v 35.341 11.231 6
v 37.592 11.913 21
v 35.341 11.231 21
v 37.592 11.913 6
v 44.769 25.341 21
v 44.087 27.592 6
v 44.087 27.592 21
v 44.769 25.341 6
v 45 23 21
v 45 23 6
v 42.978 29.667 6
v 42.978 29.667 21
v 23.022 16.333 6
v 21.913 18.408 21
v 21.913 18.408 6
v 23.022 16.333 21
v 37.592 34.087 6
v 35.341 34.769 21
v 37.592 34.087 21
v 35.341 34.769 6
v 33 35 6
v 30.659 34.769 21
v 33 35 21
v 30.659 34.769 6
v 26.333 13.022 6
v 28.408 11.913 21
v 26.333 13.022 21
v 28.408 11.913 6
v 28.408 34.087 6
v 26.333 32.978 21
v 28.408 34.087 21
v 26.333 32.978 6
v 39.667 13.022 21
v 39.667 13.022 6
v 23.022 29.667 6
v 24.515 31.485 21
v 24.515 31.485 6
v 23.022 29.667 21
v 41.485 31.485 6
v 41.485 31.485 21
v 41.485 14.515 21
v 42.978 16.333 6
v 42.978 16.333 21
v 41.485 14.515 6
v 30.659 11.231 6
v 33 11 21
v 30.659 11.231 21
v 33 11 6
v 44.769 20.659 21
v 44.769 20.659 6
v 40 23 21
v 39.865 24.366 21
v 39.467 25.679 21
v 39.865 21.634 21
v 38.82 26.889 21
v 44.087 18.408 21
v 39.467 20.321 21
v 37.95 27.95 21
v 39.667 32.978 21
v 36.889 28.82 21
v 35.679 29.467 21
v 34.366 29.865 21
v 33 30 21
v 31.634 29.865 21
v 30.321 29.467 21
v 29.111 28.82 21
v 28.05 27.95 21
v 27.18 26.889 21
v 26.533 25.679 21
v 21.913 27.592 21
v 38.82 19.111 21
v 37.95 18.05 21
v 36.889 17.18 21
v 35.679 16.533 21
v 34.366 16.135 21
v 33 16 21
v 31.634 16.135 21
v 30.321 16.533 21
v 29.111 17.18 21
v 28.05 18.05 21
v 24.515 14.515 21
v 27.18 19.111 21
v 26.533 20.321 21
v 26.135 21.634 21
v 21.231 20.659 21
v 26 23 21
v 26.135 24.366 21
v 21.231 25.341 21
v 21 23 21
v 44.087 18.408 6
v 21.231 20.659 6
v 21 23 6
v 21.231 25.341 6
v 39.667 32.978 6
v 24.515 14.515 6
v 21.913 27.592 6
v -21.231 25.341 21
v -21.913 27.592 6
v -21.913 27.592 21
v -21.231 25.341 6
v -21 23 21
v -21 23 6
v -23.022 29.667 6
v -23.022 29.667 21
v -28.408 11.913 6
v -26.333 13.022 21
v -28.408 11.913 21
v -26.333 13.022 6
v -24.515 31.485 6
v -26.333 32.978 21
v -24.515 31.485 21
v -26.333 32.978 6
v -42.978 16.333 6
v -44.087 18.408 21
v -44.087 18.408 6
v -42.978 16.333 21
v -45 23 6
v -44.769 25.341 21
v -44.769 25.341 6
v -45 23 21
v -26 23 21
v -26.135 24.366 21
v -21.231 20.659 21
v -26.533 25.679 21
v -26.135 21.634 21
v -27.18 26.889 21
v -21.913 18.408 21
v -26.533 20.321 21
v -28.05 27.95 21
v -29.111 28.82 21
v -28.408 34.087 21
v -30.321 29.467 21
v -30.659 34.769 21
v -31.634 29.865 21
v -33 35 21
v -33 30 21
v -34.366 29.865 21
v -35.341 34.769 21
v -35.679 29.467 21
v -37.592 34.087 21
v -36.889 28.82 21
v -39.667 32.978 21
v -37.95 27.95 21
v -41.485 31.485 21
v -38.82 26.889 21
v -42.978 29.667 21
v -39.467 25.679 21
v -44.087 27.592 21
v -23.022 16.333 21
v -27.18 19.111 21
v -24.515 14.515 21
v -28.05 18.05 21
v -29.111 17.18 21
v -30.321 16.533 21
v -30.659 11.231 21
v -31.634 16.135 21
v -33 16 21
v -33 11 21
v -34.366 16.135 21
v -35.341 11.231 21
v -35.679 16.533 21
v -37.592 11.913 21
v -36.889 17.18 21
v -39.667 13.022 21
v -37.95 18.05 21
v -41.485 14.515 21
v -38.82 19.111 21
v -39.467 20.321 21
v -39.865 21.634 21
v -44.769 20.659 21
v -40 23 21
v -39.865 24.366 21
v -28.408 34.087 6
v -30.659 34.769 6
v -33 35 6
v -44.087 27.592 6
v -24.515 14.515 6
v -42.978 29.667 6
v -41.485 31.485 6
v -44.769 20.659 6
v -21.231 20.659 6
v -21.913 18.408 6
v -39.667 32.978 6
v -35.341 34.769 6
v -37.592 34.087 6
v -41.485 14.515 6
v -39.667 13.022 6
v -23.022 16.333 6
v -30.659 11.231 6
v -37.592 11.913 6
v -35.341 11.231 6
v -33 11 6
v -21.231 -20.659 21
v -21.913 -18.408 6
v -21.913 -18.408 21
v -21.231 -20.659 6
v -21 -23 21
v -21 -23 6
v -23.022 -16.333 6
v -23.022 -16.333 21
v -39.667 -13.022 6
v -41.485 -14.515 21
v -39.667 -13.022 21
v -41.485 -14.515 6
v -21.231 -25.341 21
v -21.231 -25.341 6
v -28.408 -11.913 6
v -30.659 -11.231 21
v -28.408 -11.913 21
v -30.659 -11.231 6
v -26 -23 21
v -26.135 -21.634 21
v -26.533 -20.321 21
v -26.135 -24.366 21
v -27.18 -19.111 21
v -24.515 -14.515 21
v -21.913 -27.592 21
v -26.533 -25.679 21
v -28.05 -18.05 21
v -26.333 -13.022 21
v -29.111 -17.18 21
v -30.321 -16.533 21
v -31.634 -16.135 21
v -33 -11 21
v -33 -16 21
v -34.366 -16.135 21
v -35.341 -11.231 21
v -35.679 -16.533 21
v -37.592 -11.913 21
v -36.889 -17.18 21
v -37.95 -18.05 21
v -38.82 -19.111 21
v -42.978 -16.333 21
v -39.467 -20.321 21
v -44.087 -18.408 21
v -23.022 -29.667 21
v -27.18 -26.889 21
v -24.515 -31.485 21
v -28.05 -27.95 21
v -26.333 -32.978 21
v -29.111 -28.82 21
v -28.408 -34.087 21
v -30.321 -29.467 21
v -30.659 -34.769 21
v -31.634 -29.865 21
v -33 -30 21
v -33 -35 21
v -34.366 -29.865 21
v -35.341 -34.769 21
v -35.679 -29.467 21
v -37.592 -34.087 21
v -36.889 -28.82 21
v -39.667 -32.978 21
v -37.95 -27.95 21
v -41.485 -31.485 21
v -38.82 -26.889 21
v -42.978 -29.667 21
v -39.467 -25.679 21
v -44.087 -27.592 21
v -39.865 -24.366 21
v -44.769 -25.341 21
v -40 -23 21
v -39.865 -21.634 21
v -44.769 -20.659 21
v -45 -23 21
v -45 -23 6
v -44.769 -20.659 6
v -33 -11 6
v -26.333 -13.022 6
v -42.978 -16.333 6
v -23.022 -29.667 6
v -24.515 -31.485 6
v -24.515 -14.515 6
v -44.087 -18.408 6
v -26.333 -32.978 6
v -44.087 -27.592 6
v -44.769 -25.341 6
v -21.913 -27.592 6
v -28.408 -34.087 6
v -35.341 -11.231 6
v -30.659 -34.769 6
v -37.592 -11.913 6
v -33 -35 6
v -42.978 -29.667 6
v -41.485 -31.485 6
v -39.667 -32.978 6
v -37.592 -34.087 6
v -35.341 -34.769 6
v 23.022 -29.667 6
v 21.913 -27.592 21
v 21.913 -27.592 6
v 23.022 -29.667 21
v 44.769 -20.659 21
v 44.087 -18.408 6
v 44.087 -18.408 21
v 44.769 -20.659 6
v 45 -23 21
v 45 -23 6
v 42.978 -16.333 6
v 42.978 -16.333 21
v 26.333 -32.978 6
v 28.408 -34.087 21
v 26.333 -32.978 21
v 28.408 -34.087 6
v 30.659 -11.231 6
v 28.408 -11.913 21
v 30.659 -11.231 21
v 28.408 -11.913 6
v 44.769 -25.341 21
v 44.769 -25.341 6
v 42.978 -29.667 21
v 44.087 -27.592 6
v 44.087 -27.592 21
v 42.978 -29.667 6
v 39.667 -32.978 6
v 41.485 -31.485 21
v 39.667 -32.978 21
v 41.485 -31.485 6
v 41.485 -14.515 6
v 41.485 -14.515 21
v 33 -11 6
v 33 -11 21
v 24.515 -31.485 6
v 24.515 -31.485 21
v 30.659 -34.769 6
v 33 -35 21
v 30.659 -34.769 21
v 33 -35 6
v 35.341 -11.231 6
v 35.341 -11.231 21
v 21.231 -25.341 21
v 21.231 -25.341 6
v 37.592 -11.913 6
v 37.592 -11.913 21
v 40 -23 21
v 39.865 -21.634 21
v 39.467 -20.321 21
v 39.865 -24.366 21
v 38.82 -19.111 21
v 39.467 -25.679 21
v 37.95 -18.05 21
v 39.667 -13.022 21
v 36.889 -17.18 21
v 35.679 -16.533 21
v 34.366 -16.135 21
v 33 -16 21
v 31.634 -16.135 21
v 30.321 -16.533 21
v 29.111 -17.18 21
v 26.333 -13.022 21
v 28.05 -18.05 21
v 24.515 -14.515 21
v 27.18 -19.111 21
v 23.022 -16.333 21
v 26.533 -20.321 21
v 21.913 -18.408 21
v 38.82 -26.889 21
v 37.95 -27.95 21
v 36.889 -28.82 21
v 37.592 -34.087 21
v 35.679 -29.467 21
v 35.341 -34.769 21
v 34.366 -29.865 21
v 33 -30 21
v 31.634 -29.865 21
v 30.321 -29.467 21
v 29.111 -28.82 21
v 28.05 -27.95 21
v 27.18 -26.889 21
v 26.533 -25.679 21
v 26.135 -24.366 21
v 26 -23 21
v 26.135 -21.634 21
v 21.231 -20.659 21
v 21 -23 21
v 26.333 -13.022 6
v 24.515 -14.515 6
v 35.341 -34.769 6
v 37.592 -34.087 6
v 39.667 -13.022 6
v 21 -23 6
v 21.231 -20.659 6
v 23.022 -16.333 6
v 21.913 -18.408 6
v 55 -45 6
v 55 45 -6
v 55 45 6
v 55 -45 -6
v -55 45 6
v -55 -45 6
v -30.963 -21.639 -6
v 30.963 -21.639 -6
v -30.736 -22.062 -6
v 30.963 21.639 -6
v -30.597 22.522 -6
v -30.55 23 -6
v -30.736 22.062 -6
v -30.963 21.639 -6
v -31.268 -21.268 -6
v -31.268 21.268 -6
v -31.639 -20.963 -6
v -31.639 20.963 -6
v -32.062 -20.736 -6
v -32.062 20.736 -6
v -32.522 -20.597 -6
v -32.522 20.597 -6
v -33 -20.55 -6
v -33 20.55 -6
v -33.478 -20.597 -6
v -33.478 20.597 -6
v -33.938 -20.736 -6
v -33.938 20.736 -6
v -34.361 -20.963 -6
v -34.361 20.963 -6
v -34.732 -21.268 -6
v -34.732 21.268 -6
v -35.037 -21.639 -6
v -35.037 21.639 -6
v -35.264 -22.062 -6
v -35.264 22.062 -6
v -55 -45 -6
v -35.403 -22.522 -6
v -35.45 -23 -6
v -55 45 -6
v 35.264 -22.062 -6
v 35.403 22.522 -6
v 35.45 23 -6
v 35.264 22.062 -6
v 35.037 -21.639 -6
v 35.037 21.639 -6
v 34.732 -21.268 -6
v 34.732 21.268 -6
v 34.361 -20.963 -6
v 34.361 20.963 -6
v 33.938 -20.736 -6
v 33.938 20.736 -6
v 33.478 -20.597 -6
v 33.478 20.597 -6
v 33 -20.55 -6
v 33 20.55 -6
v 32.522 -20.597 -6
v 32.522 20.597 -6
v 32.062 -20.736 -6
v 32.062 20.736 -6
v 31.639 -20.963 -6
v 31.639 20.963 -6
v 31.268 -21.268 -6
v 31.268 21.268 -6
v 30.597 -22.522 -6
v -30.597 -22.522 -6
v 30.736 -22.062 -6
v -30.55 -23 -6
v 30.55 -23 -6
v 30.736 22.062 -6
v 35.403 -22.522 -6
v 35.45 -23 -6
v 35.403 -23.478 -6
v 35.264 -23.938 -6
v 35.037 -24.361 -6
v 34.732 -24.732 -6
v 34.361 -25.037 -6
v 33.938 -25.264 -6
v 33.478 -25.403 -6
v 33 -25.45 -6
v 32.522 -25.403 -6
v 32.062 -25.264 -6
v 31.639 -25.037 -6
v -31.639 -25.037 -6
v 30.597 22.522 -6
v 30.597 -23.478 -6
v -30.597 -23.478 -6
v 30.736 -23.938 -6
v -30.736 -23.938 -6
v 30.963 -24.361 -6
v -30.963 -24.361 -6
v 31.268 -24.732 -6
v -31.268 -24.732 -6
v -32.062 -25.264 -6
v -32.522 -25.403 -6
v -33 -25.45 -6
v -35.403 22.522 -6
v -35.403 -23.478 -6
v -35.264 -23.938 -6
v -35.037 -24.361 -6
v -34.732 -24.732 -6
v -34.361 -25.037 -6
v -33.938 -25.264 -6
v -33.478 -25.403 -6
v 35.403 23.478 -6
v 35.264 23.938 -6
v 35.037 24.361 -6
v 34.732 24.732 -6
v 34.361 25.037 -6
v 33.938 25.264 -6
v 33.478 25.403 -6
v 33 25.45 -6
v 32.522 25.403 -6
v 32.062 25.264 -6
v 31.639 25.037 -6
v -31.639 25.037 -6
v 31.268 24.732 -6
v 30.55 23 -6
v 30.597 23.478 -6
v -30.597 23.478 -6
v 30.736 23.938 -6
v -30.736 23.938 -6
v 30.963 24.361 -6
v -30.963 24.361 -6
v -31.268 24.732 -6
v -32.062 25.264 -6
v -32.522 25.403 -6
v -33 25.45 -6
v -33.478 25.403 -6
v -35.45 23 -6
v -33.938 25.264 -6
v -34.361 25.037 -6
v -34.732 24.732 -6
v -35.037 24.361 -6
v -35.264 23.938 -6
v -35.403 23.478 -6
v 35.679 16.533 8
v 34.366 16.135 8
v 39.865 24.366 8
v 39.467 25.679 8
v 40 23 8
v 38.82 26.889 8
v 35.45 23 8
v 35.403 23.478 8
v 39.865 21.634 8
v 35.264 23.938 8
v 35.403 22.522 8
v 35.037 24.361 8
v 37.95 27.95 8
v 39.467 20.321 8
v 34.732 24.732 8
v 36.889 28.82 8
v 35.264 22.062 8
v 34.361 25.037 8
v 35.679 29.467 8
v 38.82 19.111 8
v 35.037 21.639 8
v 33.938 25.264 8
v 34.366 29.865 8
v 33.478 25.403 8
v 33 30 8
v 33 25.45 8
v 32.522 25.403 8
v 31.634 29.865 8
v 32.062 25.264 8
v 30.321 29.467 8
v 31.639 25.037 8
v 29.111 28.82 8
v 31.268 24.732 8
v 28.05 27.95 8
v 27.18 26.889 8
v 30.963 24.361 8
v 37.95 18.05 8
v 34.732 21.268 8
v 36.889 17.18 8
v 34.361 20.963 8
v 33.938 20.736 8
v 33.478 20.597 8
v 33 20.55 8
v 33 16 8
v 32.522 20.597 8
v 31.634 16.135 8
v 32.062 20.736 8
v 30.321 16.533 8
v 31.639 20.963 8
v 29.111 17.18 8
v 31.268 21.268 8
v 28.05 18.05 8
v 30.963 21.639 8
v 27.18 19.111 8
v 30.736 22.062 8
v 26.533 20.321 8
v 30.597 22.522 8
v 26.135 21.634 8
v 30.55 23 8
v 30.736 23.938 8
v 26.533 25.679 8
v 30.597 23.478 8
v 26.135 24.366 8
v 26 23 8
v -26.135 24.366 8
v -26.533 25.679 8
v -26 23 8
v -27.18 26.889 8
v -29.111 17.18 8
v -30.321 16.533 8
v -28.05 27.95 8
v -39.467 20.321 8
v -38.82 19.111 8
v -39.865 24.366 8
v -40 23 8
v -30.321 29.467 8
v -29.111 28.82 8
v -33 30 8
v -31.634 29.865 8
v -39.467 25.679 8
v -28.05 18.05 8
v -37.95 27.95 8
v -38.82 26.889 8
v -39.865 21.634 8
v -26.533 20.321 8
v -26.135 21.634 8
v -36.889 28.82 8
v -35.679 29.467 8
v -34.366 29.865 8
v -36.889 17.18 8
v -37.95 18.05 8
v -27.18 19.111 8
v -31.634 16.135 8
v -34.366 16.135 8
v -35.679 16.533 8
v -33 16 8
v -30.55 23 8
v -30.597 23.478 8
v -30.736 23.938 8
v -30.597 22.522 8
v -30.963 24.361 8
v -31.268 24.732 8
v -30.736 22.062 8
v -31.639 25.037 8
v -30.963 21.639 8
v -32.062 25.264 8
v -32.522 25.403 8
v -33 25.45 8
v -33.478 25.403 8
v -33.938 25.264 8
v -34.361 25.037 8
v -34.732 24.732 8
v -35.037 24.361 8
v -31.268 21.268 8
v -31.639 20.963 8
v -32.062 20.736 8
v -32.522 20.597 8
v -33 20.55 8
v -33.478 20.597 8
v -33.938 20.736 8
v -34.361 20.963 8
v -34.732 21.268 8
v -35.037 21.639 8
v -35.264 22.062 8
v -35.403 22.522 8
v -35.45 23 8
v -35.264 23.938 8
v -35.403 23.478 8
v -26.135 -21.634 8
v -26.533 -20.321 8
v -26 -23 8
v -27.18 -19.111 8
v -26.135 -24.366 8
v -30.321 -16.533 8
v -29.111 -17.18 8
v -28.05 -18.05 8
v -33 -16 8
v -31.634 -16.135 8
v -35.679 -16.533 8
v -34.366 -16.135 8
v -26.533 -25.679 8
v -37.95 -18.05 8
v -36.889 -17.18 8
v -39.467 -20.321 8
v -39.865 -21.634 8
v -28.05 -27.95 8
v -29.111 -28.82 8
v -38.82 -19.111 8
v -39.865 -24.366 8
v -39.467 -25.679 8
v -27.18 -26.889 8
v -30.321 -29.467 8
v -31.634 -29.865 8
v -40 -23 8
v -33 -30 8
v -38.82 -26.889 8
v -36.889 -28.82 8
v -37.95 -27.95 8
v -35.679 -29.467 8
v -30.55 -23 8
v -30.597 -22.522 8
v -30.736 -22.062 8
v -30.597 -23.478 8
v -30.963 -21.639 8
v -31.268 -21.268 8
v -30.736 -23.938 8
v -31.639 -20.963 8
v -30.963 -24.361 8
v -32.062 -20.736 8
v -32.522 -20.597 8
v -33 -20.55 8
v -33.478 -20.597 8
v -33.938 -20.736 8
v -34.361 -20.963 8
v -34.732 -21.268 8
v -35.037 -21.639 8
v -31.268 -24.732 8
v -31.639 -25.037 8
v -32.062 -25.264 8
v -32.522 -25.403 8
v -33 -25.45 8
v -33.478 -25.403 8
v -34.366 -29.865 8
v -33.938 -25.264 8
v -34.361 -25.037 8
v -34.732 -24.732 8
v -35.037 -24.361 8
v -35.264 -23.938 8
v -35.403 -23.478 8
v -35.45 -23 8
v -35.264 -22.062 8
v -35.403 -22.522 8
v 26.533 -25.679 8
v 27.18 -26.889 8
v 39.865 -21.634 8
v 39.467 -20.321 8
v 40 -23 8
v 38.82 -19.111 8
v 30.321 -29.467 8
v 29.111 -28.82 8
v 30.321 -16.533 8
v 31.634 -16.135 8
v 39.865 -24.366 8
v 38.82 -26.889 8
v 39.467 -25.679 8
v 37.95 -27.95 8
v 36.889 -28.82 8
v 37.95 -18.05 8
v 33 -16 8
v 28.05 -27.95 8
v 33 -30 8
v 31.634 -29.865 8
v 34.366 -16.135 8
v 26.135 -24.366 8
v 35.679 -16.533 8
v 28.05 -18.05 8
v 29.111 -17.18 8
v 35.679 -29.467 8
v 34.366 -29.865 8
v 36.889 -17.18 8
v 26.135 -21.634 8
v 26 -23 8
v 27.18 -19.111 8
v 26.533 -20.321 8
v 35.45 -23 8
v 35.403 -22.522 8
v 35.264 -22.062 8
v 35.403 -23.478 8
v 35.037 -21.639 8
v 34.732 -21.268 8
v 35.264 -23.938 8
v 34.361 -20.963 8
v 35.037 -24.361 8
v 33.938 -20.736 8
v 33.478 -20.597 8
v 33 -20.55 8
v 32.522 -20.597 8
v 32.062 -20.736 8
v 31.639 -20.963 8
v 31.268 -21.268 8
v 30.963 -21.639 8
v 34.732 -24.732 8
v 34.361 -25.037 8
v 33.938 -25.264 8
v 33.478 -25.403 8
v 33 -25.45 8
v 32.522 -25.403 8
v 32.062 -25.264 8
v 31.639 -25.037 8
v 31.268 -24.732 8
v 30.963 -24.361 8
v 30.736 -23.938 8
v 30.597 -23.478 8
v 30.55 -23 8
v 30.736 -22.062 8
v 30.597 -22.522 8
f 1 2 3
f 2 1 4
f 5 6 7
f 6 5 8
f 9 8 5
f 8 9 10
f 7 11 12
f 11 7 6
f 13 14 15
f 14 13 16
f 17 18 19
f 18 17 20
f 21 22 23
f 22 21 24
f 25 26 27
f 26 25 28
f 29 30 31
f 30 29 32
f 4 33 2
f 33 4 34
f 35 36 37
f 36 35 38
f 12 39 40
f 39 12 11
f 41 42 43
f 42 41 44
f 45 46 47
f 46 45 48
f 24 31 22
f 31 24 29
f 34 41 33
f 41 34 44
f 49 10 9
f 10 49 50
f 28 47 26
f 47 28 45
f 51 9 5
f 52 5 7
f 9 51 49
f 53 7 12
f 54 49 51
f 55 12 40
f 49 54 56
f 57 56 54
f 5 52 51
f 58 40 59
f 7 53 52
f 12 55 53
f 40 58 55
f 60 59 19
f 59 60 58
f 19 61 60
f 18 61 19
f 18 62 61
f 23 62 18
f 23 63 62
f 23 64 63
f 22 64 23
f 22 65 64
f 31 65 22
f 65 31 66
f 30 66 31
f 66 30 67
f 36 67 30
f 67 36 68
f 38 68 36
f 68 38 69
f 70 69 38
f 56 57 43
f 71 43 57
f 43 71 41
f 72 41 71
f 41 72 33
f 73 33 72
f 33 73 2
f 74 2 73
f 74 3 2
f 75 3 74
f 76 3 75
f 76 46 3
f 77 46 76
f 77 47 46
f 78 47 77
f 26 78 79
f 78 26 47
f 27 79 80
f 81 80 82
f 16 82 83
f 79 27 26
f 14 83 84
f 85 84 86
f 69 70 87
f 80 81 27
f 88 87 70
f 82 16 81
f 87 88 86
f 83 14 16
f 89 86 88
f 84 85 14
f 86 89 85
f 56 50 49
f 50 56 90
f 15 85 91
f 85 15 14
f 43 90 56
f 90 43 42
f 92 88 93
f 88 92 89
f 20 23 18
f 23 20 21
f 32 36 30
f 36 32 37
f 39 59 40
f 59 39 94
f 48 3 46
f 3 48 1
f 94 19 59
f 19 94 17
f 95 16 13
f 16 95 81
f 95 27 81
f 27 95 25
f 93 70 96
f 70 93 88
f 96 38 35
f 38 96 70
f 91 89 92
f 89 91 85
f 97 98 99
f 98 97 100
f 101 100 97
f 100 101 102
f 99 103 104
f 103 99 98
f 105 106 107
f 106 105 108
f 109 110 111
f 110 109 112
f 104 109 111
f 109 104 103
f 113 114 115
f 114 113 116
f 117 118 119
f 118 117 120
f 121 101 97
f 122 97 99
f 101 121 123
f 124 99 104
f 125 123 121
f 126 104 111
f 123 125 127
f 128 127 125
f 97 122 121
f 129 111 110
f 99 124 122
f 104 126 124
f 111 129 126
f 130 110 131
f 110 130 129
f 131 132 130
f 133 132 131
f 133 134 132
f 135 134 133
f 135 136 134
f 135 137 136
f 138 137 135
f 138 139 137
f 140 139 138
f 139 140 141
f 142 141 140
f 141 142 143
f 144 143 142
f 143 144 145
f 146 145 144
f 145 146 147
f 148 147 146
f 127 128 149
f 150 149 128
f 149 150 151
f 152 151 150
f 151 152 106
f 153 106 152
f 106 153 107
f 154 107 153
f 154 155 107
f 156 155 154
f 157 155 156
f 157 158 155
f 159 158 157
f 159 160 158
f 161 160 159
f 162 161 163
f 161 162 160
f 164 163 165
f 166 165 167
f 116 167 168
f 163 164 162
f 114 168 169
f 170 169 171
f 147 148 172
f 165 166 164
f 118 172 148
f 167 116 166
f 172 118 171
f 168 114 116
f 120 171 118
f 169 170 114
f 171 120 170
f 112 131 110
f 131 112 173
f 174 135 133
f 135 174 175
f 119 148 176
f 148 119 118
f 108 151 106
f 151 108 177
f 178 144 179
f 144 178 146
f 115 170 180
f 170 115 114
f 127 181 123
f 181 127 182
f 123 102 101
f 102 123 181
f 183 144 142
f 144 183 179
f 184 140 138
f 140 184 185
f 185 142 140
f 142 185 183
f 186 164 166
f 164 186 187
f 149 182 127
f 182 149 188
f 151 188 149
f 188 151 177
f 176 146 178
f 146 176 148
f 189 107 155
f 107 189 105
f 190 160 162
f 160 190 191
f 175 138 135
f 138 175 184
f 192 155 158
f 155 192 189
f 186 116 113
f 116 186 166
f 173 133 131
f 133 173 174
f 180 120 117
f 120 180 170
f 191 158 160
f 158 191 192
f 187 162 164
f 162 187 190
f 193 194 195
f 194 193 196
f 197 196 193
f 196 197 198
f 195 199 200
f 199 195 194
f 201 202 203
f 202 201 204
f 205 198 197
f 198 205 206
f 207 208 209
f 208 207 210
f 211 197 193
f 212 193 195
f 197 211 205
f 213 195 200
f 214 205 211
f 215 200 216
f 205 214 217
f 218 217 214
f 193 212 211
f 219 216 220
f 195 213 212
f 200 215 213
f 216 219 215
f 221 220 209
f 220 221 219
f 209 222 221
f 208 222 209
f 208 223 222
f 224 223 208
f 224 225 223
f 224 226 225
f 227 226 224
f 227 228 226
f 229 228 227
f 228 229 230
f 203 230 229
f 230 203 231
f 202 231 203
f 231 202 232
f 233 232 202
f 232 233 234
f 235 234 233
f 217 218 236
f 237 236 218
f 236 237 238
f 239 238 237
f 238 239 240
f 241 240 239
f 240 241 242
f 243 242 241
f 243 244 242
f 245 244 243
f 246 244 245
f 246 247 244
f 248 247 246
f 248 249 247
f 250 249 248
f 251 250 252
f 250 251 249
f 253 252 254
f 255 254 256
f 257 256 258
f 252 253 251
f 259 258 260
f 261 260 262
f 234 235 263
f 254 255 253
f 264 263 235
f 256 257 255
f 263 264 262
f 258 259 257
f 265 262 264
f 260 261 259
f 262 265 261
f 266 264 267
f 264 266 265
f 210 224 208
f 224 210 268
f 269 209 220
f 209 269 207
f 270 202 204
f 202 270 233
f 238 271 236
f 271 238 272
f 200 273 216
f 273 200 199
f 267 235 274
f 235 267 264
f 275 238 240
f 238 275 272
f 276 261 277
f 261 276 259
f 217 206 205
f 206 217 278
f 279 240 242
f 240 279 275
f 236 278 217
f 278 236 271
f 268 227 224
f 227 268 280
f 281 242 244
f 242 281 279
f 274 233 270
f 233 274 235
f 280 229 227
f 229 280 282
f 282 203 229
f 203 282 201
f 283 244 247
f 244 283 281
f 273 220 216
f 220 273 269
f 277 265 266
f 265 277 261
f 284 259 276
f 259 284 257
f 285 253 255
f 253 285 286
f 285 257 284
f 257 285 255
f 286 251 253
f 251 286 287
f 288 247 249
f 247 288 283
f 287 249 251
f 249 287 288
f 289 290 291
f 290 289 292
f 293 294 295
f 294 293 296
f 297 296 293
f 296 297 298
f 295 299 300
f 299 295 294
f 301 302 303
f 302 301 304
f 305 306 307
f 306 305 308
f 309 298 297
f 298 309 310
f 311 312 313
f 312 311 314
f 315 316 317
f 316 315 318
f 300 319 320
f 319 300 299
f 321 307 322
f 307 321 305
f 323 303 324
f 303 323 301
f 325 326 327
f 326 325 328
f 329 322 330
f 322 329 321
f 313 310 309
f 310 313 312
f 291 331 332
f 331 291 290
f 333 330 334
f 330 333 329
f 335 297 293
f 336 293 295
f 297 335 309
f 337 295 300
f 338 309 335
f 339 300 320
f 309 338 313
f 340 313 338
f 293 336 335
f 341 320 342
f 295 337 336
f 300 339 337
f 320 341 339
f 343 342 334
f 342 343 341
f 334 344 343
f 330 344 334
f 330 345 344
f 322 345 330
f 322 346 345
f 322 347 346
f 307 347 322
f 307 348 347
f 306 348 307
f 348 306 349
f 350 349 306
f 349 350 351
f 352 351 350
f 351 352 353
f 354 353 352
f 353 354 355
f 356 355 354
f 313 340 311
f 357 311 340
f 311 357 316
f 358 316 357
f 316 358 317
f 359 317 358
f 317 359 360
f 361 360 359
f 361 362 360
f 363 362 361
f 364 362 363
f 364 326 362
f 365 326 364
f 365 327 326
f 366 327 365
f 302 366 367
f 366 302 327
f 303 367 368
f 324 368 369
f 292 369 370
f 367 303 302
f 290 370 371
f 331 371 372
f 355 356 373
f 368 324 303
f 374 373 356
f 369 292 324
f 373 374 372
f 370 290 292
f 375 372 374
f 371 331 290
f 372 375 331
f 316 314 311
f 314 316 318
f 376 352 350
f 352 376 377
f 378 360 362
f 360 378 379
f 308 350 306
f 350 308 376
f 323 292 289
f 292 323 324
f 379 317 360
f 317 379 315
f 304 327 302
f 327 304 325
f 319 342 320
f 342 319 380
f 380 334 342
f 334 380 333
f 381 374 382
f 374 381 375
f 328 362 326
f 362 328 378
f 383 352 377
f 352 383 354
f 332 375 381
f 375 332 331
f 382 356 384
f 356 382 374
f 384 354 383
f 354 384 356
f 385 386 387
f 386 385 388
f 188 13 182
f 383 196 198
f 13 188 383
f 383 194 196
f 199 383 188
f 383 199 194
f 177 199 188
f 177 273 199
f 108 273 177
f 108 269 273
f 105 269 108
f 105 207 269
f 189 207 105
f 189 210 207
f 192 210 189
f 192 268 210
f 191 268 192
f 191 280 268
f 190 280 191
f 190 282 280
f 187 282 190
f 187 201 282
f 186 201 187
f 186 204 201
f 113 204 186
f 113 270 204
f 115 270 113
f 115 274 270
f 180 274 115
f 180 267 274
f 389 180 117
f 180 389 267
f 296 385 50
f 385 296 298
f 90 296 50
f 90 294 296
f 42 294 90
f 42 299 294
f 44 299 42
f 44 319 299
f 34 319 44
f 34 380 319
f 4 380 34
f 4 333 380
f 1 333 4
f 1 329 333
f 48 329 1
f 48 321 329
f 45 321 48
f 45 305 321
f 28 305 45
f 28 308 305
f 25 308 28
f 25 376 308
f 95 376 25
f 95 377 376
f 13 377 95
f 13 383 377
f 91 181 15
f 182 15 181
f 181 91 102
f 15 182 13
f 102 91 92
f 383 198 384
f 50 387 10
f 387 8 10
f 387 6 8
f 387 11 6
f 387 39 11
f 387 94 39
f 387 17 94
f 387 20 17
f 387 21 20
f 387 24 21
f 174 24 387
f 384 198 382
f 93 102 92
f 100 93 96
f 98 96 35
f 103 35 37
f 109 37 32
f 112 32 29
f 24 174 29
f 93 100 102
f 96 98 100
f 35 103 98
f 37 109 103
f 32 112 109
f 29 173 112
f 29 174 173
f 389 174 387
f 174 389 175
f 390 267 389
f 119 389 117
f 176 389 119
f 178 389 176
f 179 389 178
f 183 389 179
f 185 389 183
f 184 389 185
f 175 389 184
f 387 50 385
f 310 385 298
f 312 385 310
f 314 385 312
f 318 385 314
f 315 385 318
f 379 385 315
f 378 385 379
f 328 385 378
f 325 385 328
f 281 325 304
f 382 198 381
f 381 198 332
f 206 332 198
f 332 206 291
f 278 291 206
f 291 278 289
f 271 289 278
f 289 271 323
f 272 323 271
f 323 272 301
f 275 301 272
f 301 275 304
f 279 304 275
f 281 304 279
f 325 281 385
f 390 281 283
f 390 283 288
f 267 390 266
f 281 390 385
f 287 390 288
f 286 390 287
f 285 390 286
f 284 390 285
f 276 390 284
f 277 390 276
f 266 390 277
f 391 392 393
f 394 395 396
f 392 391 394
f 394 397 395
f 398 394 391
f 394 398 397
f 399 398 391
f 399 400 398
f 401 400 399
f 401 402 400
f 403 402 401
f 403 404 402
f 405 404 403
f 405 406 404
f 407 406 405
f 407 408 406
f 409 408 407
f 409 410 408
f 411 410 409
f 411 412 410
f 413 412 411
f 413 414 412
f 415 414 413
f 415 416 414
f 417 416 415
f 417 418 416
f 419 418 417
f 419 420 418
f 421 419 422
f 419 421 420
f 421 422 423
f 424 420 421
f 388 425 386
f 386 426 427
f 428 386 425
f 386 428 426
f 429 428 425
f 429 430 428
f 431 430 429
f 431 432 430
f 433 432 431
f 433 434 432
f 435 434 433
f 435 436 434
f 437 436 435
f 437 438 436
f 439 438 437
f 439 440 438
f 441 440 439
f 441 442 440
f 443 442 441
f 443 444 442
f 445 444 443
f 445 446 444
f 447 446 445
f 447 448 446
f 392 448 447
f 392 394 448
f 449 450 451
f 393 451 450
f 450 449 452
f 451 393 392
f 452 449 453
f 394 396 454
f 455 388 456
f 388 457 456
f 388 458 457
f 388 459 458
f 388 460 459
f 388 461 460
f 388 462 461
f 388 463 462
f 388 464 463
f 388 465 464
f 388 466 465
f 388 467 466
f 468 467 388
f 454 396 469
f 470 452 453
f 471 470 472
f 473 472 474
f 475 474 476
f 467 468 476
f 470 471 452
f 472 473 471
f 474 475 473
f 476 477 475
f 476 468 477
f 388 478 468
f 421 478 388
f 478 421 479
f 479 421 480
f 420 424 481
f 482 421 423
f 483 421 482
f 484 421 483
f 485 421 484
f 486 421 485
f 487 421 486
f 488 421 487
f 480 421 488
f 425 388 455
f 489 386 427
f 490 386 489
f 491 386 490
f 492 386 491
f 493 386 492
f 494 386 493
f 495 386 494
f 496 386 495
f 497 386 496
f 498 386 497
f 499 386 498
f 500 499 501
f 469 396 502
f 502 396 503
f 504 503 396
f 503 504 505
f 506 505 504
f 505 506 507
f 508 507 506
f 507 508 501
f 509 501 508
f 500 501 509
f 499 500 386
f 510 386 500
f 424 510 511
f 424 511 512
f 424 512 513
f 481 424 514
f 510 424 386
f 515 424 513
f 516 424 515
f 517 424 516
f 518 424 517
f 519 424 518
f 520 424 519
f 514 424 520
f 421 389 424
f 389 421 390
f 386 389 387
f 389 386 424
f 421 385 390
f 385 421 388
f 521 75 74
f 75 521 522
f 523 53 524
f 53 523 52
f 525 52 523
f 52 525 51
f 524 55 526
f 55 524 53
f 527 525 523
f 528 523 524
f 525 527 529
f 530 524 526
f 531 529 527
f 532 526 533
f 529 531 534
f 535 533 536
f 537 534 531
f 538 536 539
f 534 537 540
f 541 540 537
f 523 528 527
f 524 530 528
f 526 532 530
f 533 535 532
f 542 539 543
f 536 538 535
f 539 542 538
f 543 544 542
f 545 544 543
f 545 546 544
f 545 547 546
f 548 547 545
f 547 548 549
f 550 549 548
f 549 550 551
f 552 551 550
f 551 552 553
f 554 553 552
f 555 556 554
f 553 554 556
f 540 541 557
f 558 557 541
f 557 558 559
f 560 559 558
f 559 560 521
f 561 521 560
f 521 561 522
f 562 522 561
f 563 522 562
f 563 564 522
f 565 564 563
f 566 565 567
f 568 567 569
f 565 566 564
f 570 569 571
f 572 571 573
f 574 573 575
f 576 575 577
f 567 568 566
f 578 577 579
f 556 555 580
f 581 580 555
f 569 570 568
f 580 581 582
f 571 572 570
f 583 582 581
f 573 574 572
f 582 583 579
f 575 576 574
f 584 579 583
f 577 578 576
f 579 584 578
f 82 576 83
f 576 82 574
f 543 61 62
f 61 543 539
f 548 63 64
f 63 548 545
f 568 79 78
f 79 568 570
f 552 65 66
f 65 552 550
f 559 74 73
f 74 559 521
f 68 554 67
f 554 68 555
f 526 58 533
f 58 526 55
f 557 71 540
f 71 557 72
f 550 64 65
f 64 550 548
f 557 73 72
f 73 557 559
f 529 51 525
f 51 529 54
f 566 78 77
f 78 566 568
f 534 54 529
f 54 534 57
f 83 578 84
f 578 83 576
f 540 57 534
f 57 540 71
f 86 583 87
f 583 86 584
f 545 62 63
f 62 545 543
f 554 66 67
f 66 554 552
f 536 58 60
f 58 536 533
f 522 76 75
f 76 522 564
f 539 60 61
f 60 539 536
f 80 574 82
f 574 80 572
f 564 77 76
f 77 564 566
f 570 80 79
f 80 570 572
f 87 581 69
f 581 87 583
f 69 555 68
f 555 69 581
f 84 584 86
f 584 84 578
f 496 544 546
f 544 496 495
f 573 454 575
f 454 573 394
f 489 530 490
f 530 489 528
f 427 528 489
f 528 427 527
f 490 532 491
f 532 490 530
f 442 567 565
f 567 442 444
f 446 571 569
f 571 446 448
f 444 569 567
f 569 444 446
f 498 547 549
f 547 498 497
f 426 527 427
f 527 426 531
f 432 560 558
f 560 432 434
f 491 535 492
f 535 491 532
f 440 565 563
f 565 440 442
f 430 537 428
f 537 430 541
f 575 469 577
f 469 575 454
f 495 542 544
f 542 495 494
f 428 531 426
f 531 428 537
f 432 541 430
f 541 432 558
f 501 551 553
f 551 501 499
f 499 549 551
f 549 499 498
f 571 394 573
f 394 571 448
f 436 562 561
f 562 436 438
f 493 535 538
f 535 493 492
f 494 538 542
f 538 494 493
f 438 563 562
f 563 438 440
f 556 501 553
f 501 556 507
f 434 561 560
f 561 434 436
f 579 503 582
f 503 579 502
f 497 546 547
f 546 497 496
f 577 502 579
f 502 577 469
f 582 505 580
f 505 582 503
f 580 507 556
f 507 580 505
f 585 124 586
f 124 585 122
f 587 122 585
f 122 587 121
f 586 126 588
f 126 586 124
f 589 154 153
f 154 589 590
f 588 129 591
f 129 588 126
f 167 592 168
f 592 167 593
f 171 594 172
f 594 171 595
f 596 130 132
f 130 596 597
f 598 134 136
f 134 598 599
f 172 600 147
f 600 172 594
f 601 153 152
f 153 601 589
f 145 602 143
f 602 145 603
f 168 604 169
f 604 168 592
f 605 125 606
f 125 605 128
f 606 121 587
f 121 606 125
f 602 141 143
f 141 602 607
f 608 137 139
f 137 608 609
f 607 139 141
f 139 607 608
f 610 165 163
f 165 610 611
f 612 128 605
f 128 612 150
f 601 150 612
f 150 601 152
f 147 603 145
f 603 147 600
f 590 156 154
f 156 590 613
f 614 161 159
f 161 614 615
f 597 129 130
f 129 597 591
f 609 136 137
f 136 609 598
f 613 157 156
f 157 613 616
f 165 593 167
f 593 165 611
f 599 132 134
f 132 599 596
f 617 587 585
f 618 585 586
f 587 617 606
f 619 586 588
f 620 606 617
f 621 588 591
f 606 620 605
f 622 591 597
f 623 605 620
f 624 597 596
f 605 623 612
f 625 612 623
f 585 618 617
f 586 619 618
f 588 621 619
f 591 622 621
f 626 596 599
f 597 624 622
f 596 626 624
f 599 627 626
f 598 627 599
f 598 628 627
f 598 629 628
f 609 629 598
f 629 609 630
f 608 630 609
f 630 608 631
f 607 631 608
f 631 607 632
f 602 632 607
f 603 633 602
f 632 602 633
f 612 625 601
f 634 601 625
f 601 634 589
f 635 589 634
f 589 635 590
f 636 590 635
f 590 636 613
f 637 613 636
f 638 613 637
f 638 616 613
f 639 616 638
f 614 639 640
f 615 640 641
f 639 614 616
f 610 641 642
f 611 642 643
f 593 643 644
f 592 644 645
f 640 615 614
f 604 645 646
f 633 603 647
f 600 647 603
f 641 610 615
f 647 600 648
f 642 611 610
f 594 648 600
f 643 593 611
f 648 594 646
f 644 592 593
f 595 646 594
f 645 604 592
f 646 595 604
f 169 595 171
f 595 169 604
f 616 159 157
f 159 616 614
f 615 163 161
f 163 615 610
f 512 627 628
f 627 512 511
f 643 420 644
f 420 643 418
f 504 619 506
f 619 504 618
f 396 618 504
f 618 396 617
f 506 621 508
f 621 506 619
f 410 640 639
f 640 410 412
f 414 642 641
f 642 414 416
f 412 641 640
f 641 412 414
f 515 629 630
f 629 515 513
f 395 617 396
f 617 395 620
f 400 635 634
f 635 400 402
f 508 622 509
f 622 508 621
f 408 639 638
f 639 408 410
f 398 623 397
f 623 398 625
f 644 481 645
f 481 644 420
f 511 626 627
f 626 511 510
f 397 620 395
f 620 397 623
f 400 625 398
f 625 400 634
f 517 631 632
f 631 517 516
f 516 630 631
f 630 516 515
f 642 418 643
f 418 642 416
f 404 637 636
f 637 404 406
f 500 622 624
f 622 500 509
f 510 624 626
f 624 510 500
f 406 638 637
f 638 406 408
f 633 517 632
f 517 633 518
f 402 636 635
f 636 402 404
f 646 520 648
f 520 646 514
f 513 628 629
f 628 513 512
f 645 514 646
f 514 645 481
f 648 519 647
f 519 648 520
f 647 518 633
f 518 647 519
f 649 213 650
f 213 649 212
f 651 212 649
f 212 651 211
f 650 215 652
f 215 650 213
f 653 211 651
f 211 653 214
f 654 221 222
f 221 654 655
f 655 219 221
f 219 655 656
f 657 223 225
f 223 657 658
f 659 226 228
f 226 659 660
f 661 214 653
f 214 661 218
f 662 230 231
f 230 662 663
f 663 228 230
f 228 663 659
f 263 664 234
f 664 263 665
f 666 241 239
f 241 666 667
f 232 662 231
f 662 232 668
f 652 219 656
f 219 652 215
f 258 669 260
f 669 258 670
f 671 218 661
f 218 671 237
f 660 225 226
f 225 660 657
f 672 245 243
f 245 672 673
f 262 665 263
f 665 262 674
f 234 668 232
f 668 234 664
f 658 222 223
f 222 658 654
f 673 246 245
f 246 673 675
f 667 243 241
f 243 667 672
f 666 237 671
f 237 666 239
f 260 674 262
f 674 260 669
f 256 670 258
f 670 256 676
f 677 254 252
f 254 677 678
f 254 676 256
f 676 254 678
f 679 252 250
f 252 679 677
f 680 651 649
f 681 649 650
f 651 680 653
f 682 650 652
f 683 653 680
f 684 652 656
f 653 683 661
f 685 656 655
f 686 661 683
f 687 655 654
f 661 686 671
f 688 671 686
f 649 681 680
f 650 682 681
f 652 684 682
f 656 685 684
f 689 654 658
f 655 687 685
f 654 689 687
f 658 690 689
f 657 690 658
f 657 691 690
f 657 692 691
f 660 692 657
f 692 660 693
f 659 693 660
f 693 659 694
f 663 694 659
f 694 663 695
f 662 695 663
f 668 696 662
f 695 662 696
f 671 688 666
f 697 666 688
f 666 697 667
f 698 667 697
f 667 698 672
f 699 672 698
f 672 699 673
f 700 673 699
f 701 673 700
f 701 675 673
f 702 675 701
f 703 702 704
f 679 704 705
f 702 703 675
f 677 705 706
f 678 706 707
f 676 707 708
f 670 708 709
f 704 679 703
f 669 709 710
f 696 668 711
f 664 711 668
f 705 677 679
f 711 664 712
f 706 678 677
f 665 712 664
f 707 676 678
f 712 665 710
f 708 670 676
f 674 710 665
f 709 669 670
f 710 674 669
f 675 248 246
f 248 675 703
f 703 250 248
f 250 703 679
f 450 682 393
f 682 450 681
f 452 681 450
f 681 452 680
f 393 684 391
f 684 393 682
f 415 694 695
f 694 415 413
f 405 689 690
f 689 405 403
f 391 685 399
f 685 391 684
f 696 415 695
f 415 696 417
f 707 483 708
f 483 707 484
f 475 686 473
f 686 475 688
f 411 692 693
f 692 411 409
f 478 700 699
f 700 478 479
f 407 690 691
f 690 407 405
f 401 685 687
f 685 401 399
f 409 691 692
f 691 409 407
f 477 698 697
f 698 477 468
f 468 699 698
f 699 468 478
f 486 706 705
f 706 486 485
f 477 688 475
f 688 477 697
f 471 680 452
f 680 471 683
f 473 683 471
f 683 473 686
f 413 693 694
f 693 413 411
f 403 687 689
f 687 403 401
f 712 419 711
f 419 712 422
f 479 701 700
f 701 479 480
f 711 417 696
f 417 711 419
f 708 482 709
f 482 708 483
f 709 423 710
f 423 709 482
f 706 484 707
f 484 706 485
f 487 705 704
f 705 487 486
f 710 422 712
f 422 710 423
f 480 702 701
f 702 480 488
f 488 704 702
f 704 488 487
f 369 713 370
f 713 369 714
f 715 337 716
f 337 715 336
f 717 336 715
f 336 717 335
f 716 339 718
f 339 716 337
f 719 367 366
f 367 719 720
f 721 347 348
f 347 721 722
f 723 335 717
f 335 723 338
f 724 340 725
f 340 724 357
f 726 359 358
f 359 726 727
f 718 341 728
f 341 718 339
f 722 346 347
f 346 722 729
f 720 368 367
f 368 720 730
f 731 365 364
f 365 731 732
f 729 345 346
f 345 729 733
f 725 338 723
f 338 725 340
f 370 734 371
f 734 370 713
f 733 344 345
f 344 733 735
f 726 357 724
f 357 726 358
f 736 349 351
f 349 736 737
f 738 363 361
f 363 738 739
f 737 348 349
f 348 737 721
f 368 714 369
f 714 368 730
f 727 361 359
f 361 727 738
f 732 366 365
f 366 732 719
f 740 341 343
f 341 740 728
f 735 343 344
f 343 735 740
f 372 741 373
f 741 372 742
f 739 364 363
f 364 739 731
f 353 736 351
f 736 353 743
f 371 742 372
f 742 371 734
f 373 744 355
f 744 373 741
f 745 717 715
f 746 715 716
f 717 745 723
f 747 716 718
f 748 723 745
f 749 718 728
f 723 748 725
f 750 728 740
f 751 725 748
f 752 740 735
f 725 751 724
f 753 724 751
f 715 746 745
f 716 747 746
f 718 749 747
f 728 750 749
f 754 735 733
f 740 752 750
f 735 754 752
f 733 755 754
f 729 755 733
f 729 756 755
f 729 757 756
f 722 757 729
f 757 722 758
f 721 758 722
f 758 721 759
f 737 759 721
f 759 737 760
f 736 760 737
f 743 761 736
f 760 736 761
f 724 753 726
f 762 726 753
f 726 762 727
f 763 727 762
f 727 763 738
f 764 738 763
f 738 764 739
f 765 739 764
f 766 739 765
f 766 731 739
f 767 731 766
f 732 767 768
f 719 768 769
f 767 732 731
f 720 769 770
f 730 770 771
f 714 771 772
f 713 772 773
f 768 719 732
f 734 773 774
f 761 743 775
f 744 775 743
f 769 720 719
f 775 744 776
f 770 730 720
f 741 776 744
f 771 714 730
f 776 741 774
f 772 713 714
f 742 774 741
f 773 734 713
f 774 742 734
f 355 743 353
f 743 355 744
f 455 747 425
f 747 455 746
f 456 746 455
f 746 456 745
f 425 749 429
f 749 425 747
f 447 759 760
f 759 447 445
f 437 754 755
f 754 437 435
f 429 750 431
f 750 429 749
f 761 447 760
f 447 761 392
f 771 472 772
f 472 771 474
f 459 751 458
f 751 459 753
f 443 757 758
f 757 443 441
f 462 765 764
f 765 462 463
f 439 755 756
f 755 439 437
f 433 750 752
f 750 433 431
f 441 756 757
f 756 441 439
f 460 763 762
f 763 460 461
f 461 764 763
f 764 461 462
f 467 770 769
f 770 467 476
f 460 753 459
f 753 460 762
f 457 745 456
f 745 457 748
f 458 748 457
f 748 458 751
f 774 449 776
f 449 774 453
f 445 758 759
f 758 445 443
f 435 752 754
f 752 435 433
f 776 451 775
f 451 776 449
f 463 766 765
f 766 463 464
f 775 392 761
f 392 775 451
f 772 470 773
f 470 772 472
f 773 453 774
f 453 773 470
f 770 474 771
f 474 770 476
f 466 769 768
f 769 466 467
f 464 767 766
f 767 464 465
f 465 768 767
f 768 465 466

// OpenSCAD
$fn = 32;

// ----------------------------------------------------------------------
// Socket pad plate
// bosses with counterbored sockets for the screws
// ----------------------------------------------------------------------

// --- parameters (mm) ---
base_t = 12;            // base plate thickness
boss_h = 15;            // boss height above the base plate
boss_d = 24;            // boss diameter
socket_d = 14;          // socket diameter
socket_depth = 13;      // socket depth from the boss face
bolt_d = 4.9;           // screw clearance hole through the socket floor
plate = [110, 90, 12];  // overall size (x, y, z)
edge = 22;              // boss centre offset from the plate edge
pads = 4;               // boss count, one per corner

// --- derived feature positions (mm) ---
height = base_t + boss_h;        // = 27   overall height of the part
corner_x = plate[0] / 2 - edge;  // = 33   boss centre X
corner_y = plate[1] / 2 - edge;  // = 23   boss centre Y
feature_centers = [
  [corner_x, corner_y],
  [-corner_x, corner_y],
  [-corner_x, -corner_y],
  [corner_x, -corner_y]
];   // boss centres: sockets, holes and the pads themselves are placed from here

// base plate, bosses on feature_centers, socket + through hole in each
difference() {
  union() {
    cube(plate, center = true);
    for (centre = feature_centers)
      translate([centre[0], centre[1], plate[2] / 2 - 1])
        cylinder(d = boss_d, h = boss_h + 1);
  }
  for (centre = feature_centers) {
    translate([centre[0], centre[1], plate[2] / 2 + boss_h - socket_depth])
      cylinder(d = socket_d, h = socket_depth + 1);
    translate([centre[0], centre[1], -height])
      cylinder(d = bolt_d, h = 2 * height + 2);  // through the socket floor
  }
}
